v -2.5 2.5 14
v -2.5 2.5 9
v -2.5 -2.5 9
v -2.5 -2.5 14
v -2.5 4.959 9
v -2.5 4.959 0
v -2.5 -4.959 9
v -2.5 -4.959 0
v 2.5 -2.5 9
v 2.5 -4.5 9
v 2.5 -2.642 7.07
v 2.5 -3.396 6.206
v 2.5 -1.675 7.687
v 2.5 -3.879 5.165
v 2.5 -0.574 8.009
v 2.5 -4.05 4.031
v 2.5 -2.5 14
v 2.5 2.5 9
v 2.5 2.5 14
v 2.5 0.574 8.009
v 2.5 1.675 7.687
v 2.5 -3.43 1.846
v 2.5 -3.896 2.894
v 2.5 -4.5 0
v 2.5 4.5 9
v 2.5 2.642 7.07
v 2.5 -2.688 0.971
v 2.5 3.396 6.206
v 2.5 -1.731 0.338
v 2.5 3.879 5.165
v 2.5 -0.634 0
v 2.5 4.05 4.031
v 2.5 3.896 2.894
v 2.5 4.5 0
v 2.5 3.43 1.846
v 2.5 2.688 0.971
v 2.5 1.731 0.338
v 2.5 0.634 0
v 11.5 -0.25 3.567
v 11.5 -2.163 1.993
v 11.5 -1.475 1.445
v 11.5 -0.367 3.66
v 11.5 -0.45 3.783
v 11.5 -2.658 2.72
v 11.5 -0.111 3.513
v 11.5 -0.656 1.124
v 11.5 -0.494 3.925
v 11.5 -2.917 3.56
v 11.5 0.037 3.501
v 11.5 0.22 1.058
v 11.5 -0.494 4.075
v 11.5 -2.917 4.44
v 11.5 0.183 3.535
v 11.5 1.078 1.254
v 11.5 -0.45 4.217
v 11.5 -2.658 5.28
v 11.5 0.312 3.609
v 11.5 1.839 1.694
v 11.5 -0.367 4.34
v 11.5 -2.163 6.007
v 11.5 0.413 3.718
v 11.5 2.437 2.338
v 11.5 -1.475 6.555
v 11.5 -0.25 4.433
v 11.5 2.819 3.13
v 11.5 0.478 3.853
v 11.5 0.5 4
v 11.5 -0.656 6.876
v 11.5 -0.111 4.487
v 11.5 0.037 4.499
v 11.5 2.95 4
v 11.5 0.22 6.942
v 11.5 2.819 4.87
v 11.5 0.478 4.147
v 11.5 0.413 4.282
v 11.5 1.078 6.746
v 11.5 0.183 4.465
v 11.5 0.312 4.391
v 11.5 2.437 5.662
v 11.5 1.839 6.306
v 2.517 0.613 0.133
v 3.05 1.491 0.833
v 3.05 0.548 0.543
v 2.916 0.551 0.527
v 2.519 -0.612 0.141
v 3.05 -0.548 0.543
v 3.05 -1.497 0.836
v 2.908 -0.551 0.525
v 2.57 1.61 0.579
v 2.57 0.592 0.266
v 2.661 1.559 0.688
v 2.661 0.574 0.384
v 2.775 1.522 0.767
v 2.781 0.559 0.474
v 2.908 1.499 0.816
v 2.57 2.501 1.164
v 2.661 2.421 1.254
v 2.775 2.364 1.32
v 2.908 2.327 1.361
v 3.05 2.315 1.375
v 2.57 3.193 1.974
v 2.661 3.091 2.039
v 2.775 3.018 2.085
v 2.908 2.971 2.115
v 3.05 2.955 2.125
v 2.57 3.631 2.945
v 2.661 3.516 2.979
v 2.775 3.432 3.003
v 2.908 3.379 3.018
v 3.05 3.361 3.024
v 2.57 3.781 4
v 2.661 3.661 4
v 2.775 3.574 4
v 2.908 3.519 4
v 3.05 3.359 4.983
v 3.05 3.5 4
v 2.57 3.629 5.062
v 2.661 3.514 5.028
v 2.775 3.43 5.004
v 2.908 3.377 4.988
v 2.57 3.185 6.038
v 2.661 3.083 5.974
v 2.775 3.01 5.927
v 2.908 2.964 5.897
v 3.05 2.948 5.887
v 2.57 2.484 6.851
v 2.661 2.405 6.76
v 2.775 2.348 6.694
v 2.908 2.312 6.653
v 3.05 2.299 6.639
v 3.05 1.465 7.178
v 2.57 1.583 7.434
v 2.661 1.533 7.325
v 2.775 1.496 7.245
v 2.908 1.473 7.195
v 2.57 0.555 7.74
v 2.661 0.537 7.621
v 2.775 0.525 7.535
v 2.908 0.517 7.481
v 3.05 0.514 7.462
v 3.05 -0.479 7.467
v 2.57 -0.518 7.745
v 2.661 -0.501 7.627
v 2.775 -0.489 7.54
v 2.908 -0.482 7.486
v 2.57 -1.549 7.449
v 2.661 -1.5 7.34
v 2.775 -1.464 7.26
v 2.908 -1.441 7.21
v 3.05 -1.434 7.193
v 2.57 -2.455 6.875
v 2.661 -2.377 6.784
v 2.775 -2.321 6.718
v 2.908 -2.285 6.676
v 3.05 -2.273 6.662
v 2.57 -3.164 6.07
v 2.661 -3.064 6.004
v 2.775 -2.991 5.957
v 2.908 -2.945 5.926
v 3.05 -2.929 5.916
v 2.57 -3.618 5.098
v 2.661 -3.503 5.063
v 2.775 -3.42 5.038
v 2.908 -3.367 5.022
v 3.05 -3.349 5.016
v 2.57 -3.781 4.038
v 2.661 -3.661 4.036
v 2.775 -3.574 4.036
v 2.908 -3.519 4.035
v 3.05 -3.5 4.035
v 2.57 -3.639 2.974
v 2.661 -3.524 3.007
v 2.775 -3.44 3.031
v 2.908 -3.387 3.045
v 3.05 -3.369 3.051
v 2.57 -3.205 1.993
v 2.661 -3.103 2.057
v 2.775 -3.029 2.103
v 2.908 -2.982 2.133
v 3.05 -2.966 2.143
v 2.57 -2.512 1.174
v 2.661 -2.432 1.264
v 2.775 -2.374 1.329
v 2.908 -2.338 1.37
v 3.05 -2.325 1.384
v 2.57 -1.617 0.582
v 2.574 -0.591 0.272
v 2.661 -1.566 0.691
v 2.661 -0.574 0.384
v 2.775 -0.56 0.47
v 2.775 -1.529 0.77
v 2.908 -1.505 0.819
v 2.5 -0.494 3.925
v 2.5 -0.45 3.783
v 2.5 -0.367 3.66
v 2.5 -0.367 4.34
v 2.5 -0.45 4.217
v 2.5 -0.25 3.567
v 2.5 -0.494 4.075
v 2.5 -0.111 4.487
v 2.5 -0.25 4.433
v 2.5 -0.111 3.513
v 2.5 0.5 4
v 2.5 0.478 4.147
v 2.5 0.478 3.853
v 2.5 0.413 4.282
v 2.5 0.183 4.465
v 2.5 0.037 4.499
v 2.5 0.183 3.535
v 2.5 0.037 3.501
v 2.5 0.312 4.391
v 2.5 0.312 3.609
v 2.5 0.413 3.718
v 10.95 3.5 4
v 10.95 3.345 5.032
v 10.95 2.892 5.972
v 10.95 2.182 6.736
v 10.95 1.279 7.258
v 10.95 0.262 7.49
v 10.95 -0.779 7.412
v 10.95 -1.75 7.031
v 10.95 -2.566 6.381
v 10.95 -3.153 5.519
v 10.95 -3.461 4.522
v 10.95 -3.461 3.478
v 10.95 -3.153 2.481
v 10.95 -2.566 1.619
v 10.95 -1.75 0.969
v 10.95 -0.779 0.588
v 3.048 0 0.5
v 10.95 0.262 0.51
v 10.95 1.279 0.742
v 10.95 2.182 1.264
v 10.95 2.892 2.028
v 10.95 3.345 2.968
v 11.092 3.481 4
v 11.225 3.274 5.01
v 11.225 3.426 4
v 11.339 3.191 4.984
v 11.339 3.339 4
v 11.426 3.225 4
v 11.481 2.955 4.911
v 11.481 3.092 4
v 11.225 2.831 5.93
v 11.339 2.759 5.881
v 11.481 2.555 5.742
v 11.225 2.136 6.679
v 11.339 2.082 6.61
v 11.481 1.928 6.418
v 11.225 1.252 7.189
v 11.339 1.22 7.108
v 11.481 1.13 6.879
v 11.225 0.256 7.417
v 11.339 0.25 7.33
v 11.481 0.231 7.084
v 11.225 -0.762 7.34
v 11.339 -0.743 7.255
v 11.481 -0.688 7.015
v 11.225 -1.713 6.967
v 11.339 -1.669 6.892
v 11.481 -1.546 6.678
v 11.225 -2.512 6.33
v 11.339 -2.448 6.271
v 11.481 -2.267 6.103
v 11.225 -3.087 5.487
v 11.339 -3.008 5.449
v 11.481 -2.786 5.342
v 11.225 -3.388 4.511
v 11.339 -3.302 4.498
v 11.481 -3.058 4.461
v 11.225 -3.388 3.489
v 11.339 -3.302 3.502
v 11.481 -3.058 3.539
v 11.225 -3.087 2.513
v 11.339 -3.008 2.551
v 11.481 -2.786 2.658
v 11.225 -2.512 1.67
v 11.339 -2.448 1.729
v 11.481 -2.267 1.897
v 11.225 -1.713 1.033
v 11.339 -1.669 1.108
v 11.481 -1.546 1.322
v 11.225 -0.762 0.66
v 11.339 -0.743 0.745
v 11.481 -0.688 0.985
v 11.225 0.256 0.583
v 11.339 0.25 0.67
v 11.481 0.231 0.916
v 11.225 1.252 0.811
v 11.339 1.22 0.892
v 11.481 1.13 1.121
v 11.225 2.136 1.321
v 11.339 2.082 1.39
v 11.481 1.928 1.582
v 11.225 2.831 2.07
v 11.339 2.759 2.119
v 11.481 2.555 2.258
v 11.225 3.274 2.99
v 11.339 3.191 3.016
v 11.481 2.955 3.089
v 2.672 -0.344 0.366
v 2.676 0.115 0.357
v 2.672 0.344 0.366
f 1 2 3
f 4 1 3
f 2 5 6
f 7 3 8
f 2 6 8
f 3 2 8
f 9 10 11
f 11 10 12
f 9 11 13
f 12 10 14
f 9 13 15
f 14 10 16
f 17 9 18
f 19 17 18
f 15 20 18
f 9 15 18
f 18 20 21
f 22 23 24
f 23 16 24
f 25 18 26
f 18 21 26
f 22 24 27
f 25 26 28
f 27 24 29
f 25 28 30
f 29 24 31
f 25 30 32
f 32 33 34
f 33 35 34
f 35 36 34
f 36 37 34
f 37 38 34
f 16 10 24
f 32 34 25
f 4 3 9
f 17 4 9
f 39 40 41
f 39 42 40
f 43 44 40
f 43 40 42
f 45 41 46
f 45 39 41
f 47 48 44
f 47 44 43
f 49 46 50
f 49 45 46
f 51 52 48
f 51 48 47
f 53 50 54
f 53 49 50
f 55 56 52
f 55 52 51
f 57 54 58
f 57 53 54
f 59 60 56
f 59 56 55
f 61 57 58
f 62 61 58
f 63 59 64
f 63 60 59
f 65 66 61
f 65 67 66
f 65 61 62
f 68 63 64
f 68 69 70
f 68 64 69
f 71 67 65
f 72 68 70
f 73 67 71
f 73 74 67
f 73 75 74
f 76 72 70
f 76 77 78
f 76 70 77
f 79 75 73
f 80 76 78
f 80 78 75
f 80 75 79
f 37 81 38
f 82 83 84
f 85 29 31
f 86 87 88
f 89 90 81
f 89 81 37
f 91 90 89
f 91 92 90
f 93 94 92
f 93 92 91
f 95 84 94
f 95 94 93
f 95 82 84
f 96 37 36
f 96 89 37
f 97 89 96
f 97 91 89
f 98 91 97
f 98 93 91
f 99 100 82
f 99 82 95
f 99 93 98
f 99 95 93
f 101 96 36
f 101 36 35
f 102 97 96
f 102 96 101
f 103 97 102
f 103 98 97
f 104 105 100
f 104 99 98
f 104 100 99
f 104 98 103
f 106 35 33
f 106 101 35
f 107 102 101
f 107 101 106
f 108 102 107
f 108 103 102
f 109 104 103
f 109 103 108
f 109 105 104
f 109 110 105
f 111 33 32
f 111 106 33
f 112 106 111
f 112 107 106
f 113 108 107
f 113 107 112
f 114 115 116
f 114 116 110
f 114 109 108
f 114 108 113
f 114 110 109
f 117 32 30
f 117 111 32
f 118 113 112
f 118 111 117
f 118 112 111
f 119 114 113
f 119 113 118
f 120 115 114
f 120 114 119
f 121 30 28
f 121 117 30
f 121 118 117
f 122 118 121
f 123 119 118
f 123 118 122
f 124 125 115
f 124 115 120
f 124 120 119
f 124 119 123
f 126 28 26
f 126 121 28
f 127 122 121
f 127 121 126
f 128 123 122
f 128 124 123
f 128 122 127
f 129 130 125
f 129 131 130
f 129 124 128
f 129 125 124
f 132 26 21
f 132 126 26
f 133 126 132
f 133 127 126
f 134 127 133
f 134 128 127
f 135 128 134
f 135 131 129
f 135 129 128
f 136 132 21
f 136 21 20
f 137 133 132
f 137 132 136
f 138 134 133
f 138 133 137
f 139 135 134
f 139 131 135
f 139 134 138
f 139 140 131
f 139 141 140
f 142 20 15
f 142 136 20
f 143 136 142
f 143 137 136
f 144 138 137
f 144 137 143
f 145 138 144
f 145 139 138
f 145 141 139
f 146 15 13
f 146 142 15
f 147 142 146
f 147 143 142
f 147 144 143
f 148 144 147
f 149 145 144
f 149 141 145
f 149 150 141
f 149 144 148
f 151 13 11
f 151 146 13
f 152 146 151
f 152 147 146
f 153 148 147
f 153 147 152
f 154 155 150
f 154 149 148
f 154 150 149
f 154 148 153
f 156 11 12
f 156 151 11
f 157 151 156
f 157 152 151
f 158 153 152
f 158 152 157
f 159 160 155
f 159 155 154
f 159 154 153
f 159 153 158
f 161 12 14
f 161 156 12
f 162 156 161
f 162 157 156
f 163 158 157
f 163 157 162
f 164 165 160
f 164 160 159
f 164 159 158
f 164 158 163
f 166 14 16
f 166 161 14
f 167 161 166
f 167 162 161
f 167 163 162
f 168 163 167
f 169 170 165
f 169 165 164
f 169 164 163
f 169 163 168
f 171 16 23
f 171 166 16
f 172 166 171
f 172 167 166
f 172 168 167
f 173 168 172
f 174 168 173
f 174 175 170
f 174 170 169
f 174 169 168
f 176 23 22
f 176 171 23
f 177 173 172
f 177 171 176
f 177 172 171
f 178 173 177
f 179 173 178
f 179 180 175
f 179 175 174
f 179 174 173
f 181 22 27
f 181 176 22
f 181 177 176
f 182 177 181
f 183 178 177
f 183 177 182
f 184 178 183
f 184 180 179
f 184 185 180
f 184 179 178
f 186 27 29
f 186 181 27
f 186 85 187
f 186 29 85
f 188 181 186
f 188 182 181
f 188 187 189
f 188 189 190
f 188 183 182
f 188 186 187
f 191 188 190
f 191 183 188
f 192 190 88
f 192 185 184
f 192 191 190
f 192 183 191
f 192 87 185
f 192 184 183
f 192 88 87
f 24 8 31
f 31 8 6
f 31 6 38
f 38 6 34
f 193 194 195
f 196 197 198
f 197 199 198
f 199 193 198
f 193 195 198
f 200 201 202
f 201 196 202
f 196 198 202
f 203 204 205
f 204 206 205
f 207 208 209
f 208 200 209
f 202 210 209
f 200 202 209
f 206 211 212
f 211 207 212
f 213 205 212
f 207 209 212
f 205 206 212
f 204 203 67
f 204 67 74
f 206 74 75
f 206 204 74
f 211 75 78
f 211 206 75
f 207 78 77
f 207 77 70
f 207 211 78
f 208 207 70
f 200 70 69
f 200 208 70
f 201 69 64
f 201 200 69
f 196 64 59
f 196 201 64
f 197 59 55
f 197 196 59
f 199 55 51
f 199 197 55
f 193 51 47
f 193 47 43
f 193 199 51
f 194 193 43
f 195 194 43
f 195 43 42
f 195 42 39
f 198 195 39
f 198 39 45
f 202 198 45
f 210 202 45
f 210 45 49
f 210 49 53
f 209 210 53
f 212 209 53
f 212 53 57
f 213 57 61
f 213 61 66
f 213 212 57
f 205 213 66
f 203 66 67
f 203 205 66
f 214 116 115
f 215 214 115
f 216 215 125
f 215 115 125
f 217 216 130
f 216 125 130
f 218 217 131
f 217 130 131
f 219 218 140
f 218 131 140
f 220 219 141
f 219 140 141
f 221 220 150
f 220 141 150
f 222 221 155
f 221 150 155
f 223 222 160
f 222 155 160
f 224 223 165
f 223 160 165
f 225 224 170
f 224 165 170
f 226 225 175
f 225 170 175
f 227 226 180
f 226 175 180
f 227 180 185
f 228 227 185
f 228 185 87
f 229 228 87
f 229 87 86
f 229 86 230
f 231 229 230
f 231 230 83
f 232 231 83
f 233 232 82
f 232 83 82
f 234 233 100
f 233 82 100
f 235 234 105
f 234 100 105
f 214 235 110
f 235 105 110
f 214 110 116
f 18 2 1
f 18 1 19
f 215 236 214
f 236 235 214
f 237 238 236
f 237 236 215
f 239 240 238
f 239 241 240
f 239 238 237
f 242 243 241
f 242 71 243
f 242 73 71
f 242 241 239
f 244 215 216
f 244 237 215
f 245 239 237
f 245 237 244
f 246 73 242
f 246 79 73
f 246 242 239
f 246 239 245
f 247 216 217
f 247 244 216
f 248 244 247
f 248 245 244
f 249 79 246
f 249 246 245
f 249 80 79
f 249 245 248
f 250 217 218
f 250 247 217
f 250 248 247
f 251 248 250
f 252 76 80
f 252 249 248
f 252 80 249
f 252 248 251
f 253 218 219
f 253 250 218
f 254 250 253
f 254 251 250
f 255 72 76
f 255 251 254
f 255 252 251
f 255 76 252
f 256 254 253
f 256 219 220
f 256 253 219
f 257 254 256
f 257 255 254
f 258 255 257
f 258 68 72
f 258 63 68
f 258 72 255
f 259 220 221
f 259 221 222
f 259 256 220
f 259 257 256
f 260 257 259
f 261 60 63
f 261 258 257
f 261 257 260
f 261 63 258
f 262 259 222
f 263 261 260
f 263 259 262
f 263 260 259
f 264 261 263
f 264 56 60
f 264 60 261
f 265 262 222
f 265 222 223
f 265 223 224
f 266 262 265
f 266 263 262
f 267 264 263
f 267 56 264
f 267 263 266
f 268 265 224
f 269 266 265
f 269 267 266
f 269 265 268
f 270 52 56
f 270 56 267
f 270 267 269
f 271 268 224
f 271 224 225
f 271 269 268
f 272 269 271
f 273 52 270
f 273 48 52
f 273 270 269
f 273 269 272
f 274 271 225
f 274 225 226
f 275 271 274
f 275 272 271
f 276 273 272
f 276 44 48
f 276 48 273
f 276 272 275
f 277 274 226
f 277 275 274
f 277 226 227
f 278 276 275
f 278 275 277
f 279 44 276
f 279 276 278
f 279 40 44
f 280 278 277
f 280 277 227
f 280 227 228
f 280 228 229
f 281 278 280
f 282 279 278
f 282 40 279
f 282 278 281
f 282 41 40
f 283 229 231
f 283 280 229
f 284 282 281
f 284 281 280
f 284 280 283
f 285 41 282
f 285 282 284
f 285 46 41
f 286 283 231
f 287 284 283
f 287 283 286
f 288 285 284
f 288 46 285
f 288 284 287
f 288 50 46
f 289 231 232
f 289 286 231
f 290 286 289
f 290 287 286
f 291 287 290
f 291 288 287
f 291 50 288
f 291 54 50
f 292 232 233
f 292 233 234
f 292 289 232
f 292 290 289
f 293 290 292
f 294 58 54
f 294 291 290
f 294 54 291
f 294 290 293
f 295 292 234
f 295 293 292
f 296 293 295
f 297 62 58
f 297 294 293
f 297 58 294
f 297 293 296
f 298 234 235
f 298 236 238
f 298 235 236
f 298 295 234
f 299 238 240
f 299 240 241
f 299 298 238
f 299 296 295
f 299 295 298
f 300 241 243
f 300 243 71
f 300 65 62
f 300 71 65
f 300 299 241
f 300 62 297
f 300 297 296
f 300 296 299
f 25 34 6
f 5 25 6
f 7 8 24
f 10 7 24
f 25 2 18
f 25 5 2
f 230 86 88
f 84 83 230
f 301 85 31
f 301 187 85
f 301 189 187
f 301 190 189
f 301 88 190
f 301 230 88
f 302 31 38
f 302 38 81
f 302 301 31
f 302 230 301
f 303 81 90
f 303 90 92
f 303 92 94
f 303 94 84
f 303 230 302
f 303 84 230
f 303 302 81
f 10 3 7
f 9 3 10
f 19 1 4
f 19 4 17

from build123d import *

# Parameters (mm, degrees)
F0_W     = 5
F0_H     = 5
F1_DEPTH = 14
F2_DEPTH = 9
F3_R     = 3.5
F3_R_2   = 0.5
F4_DEPTH = 9
F5_R     = 0.55


with BuildPart() as f1:
    # F0 (on Top) → F1 (new body)
    with BuildSketch(Plane.XY):
        Rectangle(F0_W, F0_H)
    extrude(amount=F1_DEPTH)

    # F0 (on Top) → F2 (join)
    with BuildSketch(Plane.XY):
        Polygon((-2.5, 2.5), (2.5, 2.5), (2.5, 4.5), (-2.5, 4.9594354583), align=None)
        Polygon((2.5, -4.5), (2.5, -2.5), (-2.5, -2.5), (-2.5, -4.9594354583), align=None)
    extrude(amount=F2_DEPTH)

    # F3 (on face) → F4 (join)
    with BuildSketch(Plane.YZ.offset(2.5)):
        with Locations((0, 4)):
            Circle(F3_R)
        with Locations((0, 4)):
            Circle(F3_R_2, mode=Mode.SUBTRACT)
    extrude(amount=F4_DEPTH)

    # F5
    f5_edges = [f1.edges().sort_by_distance(p)[0] for p in [
        (2.5, -3.5, 4),
        (11.5, -3.5, 4),
    ]]
    fillet(f5_edges, radius=F5_R)


solid = f1.part
